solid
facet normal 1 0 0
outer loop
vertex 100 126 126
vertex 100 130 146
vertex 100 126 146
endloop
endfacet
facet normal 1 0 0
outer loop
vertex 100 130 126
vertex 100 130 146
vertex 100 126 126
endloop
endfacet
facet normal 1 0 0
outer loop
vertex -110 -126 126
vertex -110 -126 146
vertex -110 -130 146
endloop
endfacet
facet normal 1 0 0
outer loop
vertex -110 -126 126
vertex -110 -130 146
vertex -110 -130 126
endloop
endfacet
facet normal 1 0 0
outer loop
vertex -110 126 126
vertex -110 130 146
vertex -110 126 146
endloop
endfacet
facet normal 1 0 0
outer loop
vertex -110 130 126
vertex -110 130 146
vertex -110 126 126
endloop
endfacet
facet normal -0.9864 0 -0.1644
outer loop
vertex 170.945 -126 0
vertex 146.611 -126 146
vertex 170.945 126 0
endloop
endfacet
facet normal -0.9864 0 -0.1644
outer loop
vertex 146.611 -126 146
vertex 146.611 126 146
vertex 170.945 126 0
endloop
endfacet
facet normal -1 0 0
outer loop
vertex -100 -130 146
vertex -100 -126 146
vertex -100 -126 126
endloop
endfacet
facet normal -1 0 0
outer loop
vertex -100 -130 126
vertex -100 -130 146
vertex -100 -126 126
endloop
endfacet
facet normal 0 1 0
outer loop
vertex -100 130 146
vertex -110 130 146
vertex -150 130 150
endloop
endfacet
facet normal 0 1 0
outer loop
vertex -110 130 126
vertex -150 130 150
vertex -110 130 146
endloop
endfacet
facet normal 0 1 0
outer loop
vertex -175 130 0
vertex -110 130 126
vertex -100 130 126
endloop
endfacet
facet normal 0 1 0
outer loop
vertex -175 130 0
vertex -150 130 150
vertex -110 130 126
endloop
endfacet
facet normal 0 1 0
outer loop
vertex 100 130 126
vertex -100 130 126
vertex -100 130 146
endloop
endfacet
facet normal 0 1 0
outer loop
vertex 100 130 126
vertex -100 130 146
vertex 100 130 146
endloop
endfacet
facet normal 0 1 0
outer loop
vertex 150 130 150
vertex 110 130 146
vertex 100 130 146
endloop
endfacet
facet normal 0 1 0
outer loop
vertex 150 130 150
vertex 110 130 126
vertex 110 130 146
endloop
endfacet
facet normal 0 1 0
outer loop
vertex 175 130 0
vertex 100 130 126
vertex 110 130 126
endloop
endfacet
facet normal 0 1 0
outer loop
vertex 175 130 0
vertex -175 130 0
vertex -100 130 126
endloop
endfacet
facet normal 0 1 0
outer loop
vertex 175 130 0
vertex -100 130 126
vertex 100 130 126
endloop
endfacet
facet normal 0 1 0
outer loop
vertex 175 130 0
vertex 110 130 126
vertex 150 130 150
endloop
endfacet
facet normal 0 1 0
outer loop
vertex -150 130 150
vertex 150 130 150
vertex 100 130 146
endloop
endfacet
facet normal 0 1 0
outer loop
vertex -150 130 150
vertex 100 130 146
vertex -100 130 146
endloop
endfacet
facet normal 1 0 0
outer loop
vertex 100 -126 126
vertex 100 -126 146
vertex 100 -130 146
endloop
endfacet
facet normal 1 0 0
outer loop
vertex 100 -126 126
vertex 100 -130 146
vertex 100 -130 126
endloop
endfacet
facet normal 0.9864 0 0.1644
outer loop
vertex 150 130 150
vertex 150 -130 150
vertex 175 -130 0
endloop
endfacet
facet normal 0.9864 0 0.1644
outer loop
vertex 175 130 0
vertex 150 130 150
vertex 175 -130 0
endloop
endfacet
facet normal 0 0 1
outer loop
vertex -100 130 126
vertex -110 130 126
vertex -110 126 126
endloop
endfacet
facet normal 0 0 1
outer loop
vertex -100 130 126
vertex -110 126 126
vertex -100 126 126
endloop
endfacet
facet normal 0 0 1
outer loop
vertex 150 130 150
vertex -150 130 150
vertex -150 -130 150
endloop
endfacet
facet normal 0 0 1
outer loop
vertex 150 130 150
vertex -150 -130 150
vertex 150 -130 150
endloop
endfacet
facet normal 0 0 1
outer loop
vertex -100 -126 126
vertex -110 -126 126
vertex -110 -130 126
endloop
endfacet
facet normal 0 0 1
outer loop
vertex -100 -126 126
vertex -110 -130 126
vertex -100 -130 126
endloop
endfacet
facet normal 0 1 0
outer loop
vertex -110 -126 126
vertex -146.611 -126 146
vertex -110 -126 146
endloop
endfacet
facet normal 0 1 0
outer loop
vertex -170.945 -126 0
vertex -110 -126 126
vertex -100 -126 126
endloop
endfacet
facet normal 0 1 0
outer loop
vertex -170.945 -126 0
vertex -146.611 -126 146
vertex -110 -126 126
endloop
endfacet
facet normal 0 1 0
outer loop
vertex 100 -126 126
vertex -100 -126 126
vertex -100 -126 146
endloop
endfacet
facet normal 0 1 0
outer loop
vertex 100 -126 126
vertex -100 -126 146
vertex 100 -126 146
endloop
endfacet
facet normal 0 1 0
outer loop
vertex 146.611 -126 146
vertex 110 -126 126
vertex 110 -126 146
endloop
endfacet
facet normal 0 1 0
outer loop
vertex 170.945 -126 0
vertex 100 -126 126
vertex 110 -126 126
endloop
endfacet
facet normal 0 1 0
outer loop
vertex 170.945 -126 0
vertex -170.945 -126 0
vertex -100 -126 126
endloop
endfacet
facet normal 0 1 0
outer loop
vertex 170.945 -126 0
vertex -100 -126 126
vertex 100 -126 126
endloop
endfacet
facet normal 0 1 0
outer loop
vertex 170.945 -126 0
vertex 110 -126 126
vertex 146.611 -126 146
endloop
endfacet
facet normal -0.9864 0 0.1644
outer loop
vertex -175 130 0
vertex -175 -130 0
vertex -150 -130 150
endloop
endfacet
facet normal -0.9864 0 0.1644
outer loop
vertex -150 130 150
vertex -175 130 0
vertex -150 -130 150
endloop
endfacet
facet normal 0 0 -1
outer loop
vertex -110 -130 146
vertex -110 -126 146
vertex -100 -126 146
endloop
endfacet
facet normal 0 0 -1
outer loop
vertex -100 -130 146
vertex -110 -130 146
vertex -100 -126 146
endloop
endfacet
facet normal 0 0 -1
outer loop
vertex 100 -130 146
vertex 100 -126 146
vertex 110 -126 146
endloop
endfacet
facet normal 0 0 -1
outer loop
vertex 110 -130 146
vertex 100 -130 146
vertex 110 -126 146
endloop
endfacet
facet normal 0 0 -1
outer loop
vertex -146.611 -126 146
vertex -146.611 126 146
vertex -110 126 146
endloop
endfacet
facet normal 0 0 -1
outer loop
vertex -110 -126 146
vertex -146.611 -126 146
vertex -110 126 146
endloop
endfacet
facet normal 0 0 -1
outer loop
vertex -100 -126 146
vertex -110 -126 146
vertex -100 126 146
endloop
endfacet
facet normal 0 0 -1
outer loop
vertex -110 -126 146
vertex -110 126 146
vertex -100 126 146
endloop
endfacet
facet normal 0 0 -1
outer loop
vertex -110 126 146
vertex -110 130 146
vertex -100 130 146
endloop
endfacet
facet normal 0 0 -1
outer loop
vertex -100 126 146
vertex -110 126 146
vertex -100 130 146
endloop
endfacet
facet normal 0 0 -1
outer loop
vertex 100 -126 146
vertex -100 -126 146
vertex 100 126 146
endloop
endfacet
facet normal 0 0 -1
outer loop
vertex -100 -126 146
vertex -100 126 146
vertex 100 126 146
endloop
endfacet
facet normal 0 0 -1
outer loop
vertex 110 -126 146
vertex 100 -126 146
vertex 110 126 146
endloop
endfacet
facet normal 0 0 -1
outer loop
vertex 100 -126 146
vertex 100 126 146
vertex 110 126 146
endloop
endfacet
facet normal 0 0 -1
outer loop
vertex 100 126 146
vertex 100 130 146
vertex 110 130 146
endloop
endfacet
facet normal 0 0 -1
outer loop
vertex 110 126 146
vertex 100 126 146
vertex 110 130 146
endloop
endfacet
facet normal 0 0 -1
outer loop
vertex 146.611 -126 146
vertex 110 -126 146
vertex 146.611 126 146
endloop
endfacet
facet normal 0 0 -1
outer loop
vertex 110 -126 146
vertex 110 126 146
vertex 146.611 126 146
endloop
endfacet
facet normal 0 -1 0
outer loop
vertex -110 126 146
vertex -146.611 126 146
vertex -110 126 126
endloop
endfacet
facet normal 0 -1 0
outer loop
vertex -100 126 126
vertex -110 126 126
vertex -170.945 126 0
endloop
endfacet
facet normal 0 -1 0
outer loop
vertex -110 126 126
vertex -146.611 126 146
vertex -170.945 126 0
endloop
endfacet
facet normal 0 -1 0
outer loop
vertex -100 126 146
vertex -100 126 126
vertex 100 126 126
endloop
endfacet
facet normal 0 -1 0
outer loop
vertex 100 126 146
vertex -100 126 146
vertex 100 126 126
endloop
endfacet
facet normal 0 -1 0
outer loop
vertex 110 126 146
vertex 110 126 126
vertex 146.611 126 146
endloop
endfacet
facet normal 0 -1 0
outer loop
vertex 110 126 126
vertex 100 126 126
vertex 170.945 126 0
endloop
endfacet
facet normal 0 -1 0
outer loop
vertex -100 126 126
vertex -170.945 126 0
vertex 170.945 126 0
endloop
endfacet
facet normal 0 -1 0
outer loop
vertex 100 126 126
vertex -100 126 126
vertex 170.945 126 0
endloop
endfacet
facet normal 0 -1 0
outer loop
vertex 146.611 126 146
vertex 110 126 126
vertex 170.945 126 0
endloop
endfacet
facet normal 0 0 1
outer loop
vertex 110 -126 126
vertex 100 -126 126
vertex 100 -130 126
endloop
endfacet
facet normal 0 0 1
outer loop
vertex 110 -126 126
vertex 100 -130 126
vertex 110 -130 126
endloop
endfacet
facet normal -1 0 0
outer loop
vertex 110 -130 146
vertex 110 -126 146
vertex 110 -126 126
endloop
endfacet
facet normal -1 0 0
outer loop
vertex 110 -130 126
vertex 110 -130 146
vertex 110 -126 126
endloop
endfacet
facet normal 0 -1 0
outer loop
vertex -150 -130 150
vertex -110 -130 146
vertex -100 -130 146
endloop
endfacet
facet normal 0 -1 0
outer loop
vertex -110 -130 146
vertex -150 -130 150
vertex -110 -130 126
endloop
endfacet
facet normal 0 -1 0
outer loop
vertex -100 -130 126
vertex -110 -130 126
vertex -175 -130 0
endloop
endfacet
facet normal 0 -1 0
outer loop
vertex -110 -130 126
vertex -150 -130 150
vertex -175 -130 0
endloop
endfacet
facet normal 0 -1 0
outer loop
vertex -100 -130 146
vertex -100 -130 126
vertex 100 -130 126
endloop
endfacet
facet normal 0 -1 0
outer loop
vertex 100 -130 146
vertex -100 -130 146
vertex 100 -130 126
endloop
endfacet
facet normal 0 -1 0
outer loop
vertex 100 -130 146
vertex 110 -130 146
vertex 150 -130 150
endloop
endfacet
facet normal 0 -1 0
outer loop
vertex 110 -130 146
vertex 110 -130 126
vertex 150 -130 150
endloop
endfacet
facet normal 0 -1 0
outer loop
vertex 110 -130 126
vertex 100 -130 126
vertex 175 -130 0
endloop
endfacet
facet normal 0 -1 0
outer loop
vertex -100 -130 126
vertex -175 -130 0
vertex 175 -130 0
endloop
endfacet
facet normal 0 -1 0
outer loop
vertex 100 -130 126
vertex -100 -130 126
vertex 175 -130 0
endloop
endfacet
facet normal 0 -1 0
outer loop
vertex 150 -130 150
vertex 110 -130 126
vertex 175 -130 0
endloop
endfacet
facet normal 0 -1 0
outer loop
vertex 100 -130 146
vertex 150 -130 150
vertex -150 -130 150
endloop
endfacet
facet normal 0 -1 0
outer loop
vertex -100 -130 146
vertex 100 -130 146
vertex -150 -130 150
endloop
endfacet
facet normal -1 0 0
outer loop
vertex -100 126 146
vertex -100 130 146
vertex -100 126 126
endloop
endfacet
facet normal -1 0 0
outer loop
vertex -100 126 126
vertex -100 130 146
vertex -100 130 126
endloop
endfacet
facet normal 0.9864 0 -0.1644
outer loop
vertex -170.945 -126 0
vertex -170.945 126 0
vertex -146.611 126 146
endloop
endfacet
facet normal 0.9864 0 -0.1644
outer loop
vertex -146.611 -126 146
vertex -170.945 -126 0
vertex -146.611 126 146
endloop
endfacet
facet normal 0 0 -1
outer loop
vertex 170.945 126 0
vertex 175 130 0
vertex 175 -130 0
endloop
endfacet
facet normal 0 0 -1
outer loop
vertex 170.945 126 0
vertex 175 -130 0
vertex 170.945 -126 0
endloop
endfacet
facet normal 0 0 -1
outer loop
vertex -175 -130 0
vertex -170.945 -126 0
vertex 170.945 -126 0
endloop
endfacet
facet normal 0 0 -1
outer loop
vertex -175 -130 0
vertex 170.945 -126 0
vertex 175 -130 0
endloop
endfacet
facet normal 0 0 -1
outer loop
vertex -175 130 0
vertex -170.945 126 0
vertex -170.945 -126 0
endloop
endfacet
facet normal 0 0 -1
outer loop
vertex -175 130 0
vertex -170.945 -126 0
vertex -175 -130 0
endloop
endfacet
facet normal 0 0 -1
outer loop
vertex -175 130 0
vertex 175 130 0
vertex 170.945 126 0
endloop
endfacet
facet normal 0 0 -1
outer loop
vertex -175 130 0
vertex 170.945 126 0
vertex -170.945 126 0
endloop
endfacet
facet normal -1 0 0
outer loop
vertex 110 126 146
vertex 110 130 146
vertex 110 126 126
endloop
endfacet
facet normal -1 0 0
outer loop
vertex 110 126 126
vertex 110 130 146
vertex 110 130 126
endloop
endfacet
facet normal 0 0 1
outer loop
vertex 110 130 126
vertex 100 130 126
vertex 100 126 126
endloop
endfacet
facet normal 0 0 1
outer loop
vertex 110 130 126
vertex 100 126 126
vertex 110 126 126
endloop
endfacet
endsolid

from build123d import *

# Parameters (mm, degrees)
EXTRUDE_2_DEPTH     = 130
SHELL_2_T           = -4
SKETCH_5_W          = 10
SKETCH_5_H          = 20
CUT_EXTRUDE_1_DEPTH = 260


with BuildPart() as part:
    # 草图1 → 凸台-拉伸2 (new, symmetric)
    with BuildSketch(Plane(origin=(0, 0, 0), x_dir=(1, 0, 0), z_dir=(0, 1, 0))):
        Polygon((175, 0), (-175, 0), (-150, -150), (150, -150), align=None)
    extrude(amount=EXTRUDE_2_DEPTH, both=True)

    # 抽壳2
    shell_2_openings = [part.faces().sort_by_distance(p)[0] for p in [
        (0, 0, 0),
    ]]
    offset(amount=SHELL_2_T, openings=shell_2_openings, kind=Kind.INTERSECTION)

    # 草图5 → 切除-拉伸1 (cut)
    with BuildSketch(Plane(origin=(0, 130, 0), x_dir=(1, 0, 0), z_dir=(0, 1, 0))):
        with Locations((-105, -136)):
            Rectangle(SKETCH_5_W, SKETCH_5_H)
        with Locations((105, -136)):
            Rectangle(SKETCH_5_W, SKETCH_5_H)
    extrude(amount=-CUT_EXTRUDE_1_DEPTH, mode=Mode.SUBTRACT)


solid = part.part
